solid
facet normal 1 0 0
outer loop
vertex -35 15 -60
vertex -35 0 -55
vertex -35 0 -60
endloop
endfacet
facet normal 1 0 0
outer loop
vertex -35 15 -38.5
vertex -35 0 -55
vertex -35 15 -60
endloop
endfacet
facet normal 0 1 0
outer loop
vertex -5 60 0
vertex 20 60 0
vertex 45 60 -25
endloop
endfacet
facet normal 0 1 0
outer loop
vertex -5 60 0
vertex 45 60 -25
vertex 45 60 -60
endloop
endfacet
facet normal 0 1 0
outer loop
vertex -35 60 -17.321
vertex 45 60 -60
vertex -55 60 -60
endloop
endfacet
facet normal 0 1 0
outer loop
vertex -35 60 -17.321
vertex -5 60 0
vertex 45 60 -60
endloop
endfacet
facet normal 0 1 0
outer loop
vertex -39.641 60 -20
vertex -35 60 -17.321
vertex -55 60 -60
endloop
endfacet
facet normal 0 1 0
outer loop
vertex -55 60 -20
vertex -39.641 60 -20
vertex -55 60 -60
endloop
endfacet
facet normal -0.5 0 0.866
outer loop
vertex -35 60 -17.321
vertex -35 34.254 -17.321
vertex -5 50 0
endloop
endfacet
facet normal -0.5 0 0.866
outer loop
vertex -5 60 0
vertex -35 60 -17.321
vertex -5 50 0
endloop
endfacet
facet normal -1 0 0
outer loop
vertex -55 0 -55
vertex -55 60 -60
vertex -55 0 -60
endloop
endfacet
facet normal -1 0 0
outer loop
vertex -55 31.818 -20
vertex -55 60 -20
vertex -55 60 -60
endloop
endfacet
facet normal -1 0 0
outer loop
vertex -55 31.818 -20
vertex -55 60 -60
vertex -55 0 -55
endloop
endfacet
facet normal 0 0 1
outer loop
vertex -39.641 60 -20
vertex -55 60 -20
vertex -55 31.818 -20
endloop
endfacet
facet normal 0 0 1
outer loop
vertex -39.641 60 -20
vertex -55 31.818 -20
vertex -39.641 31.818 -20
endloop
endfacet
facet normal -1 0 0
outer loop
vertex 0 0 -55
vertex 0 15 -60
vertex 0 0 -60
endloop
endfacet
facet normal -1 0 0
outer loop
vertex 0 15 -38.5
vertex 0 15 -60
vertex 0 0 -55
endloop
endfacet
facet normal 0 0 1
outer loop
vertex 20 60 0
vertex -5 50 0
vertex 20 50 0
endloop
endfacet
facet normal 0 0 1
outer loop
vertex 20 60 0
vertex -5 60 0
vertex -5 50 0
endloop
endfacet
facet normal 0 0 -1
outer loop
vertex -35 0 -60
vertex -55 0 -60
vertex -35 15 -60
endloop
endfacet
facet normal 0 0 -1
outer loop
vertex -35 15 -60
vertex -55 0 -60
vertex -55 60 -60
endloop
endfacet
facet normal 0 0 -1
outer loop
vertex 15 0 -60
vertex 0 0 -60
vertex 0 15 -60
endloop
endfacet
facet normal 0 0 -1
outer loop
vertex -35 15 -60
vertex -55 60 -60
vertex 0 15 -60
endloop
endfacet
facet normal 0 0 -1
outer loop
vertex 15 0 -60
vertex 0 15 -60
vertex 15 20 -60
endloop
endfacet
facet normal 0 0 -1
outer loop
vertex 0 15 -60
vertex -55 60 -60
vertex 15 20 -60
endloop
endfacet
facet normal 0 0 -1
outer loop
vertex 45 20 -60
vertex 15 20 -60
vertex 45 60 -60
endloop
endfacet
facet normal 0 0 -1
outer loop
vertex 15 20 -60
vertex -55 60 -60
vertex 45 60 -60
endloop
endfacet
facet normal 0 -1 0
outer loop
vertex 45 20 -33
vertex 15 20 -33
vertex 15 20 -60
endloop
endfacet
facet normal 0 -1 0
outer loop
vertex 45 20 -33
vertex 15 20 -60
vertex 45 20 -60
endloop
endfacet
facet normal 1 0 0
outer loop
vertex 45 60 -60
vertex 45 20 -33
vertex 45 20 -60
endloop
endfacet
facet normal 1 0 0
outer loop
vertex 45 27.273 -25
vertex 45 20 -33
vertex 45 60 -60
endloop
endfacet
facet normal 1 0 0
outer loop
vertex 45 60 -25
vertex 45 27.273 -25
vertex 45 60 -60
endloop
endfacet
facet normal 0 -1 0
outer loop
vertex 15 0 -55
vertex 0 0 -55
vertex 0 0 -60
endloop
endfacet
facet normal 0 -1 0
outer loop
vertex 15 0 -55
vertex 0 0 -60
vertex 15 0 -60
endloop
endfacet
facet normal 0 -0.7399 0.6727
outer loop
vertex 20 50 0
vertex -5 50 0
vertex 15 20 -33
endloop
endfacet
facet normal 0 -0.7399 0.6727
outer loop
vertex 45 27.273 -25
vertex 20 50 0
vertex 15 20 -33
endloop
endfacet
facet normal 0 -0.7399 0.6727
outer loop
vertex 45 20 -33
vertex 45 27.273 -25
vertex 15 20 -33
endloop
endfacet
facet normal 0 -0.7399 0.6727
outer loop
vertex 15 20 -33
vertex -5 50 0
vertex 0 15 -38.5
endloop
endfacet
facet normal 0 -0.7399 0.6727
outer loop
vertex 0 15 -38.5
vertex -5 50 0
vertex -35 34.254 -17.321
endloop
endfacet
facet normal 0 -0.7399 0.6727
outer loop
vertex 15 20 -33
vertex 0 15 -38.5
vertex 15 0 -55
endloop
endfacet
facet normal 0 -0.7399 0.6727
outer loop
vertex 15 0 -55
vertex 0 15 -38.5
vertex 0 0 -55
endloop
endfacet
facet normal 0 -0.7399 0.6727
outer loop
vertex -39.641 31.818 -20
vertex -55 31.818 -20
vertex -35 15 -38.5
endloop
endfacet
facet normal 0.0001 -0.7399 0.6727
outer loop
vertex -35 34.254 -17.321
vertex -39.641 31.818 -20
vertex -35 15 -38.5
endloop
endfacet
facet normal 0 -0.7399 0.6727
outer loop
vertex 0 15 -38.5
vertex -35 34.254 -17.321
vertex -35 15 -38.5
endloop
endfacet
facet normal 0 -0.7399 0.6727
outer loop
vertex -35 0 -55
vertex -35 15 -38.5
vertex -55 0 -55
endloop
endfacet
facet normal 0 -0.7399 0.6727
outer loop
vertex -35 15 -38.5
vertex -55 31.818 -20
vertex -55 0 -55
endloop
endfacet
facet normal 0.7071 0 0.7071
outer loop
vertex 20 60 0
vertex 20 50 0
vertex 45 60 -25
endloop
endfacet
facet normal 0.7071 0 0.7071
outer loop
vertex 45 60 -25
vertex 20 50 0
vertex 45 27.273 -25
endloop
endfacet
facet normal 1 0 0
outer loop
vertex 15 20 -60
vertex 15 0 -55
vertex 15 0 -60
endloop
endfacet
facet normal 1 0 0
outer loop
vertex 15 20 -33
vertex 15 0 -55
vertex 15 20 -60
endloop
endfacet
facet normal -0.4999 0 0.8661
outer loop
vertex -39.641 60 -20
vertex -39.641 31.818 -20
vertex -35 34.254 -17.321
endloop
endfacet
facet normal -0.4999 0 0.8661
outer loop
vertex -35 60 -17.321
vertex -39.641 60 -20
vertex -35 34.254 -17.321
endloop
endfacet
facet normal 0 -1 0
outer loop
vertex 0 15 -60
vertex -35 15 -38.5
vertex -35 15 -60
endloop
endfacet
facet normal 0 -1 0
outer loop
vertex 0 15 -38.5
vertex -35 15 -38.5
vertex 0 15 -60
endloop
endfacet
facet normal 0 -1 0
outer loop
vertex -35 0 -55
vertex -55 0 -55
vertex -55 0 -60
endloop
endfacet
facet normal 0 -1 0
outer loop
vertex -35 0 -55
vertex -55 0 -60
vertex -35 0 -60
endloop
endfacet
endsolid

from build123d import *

# Parameters (mm, degrees)
F1_DEPTH = 60
F3_DEPTH = 100.001
F5_DEPTH = 60.001


with BuildPart() as f1:
    # F0 (on Top) → F1 (new body)
    with BuildSketch(Plane.XY):
        Polygon((45, 60), (-55, 60), (-55, 0), (-35, 0), (-35, 15), (0, 15), (0, 0), (15, 0), (15, 20), (45, 20), align=None)
    extrude(amount=-F1_DEPTH)

    # F2 (on face) → F3 (cut, through all)
    with BuildSketch(Plane(origin=(-55, 0, 0), x_dir=(0, -1, 0), z_dir=(-1, 0, 0))):
        Polygon((0, 0), (-50, 0), (0, -55), align=None)
    extrude(amount=-F3_DEPTH, mode=Mode.SUBTRACT)

    # F4 (on Front) → F5 (cut, through all)
    with BuildSketch(Plane.XZ):
        Polygon((-35, 0), (-55, 0), (-55, -20), (-39.641016, -20), (-35, -17.320508), align=None)
        Polygon((-5, 0), (-35, 0), (-35, -17.320508), align=None)
        Polygon((45, -25), (45, 0), (20, 0), align=None)
    extrude(amount=-F5_DEPTH, mode=Mode.SUBTRACT)


solid = f1.part
